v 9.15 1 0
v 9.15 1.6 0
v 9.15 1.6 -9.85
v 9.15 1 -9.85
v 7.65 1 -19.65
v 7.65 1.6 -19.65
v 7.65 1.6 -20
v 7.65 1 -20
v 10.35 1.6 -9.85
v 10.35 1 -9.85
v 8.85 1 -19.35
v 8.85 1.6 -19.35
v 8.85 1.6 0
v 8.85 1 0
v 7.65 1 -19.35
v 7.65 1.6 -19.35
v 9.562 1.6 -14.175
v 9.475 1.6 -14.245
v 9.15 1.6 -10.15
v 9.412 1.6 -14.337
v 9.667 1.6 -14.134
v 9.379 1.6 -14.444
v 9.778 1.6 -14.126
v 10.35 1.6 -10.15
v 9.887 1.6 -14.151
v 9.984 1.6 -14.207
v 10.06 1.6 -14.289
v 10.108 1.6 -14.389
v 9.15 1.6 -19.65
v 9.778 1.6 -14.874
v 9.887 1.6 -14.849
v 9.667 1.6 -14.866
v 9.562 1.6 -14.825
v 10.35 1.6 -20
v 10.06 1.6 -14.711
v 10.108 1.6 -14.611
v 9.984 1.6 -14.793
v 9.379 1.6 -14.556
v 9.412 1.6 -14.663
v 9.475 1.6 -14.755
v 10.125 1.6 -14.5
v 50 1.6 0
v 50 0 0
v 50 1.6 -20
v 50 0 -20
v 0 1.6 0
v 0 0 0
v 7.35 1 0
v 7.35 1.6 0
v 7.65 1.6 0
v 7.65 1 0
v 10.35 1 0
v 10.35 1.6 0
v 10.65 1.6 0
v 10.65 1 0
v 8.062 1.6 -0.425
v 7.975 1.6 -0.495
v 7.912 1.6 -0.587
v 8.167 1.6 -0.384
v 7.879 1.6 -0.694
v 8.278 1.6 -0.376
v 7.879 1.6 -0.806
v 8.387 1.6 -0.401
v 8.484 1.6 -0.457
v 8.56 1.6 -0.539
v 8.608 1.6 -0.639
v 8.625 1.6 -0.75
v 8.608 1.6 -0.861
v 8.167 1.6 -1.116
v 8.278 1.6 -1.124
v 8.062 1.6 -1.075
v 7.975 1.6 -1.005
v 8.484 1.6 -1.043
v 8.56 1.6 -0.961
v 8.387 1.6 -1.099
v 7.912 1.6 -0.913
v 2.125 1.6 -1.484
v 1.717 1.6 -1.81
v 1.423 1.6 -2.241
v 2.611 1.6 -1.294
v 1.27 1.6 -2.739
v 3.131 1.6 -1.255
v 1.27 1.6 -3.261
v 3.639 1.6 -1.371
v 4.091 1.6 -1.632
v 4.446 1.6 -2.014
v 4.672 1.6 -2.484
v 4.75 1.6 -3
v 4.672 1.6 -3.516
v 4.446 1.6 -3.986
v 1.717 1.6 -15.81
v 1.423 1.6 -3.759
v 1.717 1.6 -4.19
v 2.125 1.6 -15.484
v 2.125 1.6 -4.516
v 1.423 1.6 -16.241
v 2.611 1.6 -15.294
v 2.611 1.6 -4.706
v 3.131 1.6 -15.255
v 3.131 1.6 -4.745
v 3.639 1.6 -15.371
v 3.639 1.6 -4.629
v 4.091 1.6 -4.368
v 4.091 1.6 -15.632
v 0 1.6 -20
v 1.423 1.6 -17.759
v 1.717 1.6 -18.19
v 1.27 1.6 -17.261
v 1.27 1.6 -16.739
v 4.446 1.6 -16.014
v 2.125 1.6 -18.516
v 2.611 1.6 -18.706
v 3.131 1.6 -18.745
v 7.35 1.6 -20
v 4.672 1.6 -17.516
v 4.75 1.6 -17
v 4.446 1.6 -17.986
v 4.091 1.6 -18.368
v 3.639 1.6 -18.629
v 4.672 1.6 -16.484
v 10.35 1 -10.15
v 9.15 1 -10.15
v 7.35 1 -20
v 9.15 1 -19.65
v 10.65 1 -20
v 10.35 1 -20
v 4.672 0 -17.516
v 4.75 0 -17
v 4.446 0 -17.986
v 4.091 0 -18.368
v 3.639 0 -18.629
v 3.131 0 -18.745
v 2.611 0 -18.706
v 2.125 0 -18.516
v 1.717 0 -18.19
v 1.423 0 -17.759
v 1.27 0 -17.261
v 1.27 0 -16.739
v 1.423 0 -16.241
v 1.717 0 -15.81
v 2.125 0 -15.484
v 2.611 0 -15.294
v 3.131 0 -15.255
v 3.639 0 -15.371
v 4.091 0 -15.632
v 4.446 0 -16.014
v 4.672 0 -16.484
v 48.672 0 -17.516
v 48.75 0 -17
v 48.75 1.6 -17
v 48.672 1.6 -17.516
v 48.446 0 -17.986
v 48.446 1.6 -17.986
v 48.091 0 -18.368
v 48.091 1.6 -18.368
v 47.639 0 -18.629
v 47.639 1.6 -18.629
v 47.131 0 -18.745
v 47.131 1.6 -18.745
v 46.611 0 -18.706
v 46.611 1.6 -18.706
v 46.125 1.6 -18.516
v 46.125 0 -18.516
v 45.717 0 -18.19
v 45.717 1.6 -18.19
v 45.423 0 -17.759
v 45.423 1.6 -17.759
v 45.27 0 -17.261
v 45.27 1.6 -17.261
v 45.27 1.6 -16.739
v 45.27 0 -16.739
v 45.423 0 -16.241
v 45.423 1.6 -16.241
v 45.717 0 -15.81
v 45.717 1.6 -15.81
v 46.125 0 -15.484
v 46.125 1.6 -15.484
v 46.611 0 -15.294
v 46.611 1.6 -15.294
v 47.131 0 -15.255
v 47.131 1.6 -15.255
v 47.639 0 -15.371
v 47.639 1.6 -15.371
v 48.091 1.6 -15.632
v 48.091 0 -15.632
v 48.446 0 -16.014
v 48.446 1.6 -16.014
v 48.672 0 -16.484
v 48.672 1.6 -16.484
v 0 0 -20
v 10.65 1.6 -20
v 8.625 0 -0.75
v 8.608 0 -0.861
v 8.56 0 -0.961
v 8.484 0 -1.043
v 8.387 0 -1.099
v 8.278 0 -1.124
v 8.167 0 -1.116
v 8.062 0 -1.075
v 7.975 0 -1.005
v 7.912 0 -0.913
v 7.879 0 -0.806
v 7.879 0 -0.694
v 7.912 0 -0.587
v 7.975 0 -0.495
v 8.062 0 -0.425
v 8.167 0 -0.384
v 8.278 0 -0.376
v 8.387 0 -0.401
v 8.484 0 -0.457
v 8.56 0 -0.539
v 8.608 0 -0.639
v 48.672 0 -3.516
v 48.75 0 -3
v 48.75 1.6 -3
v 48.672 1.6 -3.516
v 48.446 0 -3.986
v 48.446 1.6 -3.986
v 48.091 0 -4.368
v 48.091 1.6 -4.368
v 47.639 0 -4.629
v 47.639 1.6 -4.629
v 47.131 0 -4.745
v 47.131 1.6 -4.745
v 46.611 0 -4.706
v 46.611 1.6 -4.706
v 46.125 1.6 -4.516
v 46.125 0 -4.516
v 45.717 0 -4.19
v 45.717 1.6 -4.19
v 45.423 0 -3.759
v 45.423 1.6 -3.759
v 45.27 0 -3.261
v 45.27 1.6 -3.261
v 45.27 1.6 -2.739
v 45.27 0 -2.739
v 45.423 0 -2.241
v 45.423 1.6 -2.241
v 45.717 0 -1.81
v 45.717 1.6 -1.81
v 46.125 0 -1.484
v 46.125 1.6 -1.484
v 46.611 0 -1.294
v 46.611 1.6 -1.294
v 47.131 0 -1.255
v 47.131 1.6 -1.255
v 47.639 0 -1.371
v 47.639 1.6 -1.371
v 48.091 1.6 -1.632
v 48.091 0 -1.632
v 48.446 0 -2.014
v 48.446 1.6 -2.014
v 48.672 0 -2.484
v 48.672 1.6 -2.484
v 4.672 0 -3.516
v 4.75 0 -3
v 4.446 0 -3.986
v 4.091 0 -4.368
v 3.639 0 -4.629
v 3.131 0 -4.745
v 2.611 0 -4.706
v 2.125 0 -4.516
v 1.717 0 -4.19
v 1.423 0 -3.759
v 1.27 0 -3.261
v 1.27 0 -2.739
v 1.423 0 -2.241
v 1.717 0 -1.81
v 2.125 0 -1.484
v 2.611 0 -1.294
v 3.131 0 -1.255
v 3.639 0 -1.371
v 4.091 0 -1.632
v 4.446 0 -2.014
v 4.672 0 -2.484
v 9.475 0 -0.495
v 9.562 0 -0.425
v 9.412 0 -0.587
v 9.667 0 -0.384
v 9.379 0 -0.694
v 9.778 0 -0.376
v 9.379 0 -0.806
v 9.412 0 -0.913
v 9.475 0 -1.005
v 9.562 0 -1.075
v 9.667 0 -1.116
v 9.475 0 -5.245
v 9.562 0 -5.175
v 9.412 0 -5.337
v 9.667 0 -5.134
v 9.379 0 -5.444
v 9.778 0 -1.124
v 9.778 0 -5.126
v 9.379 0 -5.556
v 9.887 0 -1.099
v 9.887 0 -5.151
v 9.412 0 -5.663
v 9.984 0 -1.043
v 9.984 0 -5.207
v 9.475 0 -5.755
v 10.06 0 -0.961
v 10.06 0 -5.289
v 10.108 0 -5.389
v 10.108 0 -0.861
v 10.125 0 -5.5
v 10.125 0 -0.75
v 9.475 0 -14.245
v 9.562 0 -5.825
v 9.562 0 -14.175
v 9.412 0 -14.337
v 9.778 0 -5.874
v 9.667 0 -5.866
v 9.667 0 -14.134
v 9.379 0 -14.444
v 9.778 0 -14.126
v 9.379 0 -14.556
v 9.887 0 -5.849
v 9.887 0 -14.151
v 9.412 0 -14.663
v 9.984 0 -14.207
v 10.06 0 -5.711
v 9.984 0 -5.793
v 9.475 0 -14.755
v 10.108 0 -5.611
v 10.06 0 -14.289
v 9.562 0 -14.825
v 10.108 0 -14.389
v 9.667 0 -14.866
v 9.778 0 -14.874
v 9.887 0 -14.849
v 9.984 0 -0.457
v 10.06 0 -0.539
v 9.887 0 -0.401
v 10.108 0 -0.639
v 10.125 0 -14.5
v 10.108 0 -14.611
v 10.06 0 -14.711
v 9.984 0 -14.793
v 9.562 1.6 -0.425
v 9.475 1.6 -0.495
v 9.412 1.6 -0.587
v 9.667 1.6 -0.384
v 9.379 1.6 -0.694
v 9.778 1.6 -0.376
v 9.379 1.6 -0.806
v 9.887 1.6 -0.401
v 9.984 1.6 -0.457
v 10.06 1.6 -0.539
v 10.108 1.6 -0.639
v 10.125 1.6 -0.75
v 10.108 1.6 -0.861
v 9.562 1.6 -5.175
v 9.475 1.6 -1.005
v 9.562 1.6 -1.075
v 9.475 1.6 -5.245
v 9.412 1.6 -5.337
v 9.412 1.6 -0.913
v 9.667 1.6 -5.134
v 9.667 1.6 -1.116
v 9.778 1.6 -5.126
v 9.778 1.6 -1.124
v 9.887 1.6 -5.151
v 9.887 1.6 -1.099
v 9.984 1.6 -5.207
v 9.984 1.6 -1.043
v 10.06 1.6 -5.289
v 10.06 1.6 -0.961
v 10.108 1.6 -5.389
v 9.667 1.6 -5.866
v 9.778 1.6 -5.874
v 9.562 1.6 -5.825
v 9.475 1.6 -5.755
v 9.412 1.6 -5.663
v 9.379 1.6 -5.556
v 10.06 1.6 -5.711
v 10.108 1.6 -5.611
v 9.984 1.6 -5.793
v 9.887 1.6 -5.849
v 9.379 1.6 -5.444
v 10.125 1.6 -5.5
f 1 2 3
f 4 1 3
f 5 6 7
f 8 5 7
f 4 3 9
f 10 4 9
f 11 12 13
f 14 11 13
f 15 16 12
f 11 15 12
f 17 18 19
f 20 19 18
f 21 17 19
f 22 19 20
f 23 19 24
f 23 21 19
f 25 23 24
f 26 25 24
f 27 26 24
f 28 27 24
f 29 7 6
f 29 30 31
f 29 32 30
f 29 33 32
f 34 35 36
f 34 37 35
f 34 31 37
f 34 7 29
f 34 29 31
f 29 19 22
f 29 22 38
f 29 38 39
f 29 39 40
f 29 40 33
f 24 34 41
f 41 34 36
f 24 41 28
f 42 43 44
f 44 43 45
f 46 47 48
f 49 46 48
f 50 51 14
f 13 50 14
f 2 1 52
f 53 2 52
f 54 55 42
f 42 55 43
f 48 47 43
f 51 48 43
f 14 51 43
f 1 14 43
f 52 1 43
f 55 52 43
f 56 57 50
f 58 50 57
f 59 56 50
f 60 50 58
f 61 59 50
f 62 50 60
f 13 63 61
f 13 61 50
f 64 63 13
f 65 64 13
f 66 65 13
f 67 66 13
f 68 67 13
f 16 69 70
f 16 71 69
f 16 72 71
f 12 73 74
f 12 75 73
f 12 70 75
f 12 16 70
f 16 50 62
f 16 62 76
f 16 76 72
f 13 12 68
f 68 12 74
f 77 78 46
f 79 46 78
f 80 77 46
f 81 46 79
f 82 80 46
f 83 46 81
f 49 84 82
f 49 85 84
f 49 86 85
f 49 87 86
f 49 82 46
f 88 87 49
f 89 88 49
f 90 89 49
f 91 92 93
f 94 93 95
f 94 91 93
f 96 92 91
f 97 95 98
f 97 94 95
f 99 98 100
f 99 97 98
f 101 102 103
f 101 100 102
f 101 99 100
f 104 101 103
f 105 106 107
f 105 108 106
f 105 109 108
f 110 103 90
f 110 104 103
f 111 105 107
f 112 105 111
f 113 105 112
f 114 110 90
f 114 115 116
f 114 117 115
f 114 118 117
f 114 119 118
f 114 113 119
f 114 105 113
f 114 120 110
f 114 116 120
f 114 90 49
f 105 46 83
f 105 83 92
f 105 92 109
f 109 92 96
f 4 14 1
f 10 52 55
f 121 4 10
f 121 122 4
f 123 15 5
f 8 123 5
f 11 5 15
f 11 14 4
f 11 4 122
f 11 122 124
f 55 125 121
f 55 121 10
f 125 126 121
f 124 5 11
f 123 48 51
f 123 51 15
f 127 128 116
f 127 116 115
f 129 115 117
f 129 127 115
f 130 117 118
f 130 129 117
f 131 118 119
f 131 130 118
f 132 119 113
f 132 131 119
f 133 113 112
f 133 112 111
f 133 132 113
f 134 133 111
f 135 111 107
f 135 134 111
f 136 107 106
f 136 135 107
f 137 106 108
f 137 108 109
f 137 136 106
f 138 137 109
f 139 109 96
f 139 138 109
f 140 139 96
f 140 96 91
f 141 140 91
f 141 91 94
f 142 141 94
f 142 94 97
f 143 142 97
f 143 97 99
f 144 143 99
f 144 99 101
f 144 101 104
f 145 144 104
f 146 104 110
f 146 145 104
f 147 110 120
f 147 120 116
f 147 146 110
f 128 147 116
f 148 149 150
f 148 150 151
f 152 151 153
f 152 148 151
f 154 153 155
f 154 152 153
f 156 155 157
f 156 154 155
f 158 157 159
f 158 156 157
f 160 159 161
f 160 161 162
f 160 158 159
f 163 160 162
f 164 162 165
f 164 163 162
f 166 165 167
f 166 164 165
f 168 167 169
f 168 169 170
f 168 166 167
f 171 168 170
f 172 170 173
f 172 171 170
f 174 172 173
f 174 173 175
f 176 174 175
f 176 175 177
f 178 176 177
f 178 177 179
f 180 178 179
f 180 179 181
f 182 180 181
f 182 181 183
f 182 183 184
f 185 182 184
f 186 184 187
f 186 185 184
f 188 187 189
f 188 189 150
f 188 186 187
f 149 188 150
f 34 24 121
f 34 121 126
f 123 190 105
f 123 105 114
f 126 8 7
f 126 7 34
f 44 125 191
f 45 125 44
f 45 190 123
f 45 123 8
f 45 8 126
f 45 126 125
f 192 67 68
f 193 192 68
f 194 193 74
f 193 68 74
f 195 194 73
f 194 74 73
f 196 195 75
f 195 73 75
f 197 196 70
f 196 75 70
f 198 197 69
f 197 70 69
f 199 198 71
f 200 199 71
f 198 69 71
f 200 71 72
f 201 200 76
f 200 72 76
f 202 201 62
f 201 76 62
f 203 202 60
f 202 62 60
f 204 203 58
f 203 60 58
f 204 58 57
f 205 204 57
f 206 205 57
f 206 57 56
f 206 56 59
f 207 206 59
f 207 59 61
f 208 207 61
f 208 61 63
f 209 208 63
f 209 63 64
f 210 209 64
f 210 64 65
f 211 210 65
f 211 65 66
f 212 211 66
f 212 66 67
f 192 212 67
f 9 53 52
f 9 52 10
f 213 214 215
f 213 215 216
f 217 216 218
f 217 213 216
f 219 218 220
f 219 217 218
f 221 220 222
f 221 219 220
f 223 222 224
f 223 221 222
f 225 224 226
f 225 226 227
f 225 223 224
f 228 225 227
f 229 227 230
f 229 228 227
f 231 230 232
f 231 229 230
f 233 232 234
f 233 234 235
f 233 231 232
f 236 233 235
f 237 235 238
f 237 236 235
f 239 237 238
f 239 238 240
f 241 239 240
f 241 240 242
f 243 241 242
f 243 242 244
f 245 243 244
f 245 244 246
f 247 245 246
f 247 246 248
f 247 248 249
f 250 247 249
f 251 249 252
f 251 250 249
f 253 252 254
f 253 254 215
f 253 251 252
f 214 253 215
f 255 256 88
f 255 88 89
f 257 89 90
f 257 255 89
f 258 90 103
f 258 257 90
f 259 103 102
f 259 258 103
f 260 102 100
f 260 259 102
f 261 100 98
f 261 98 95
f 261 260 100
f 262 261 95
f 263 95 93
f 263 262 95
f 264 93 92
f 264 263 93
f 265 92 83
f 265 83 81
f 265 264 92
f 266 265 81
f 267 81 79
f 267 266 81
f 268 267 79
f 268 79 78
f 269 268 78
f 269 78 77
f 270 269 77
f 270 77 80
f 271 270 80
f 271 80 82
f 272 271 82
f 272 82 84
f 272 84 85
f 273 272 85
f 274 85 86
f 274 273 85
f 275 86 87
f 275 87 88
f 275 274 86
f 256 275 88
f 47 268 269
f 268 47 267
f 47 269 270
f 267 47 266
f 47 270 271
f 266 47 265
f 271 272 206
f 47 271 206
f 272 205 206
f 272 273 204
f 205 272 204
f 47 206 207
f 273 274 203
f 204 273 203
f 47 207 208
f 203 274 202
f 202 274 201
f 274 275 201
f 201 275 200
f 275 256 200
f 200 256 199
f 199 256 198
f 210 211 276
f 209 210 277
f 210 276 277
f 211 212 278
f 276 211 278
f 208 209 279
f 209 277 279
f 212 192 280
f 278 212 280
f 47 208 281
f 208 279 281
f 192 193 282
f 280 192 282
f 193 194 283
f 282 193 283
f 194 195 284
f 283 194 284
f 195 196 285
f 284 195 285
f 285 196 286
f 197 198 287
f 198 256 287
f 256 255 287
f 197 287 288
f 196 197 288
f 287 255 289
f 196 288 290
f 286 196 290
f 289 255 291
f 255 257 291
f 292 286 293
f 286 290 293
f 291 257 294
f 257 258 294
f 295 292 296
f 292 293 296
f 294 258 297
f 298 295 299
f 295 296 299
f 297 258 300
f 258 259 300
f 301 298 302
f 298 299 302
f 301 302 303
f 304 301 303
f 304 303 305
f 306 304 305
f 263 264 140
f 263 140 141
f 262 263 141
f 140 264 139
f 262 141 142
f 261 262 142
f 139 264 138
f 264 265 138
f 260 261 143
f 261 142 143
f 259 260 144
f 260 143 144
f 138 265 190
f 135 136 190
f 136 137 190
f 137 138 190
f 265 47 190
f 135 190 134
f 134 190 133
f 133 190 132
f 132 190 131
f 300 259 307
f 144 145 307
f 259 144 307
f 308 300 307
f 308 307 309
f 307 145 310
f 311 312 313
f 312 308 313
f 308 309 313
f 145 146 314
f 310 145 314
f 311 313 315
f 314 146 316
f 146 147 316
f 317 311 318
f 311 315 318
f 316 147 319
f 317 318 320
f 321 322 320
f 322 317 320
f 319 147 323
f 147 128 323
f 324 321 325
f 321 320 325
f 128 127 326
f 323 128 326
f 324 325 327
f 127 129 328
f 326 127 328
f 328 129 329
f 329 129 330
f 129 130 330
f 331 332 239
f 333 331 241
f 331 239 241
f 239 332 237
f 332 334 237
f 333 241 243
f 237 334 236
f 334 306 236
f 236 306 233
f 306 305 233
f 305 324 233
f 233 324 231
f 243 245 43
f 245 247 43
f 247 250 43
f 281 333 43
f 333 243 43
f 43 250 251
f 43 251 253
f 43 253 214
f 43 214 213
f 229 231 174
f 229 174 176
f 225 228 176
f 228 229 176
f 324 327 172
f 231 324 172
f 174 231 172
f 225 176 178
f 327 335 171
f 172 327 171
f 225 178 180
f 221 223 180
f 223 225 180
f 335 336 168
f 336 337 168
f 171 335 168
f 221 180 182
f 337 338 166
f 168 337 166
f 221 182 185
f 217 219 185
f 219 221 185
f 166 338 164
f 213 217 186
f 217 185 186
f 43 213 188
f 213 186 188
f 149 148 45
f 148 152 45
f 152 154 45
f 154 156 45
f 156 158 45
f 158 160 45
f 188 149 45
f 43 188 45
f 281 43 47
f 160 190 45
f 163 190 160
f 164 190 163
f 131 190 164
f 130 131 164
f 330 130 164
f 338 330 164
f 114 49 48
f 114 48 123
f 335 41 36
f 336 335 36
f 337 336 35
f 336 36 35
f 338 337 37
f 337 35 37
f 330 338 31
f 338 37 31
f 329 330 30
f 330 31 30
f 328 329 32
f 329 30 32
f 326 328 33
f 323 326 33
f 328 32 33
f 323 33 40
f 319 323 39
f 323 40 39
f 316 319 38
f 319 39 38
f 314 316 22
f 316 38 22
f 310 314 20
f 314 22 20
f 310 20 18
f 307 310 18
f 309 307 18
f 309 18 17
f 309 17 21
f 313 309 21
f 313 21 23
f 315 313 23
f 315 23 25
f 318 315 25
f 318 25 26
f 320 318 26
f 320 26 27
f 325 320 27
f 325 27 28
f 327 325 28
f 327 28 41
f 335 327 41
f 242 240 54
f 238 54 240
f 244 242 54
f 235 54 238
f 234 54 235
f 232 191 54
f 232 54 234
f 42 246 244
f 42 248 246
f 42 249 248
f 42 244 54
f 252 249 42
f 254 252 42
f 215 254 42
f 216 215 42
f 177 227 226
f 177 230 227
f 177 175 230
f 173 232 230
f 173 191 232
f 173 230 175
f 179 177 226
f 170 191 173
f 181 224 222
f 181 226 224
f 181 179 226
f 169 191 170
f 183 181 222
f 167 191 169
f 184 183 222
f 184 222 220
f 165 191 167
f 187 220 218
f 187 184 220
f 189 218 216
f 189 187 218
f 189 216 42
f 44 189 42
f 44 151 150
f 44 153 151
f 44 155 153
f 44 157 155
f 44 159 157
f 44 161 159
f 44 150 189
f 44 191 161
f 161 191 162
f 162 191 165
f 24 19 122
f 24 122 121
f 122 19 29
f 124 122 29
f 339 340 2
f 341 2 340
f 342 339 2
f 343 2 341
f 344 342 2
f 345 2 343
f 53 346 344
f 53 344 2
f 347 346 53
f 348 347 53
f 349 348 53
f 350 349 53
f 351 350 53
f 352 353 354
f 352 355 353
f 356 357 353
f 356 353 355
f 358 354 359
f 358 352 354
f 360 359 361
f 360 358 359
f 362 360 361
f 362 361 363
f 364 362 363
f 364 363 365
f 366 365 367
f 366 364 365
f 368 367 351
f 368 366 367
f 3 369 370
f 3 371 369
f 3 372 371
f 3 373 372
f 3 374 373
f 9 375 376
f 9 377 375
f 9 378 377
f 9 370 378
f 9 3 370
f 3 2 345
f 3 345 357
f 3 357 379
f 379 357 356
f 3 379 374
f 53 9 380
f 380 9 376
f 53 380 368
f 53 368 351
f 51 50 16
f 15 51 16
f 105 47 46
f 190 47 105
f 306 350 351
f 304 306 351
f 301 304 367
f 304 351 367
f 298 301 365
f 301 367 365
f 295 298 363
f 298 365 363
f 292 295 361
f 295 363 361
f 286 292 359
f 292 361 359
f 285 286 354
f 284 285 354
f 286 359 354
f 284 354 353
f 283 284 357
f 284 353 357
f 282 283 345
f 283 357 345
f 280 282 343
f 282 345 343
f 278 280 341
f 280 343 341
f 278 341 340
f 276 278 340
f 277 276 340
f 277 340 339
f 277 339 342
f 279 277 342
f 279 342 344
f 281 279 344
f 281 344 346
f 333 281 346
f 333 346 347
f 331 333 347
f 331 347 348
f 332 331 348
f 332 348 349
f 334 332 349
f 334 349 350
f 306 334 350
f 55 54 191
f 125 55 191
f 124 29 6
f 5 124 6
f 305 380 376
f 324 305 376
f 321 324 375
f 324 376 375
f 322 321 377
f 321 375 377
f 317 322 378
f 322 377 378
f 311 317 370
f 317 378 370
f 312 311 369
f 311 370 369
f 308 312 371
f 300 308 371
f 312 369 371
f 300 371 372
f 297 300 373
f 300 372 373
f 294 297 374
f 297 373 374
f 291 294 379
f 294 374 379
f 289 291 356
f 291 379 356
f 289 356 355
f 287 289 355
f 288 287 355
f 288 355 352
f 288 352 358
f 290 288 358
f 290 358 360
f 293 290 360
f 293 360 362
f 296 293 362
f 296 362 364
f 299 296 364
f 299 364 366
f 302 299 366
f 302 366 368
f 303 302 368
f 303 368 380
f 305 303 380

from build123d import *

# Parameters (mm, degrees)
SKETCH1_W           = 50
SKETCH1_H           = 20
SKETCH1_R           = 1.75
BOSS_EXTRUDE1_DEPTH = 1.6
SKETCH3_R           = 0.375
CUT_EXTRUDE1_DEPTH  = 2.6
SKETCH2_W           = 0.3
SKETCH2_H           = 20
SKETCH2_W_2         = 1.5
SKETCH2_H_2         = 0.3
CUT_EXTRUDE2_DEPTH  = 0.6


with BuildPart() as part:
    # Sketch1 → Boss-Extrude1 (new body)
    with BuildSketch(Plane(origin=(0, 0, 0), x_dir=(1, 0, 0), z_dir=(0, 1, 0))):
        with Locations((25, 10)):
            Rectangle(SKETCH1_W, SKETCH1_H)
        with Locations((3, 17)):
            Circle(SKETCH1_R, mode=Mode.SUBTRACT)
        with Locations((47, 3)):
            Circle(SKETCH1_R, mode=Mode.SUBTRACT)
        with Locations((3, 3)):
            Circle(SKETCH1_R, mode=Mode.SUBTRACT)
        with Locations((47, 17)):
            Circle(SKETCH1_R, mode=Mode.SUBTRACT)
    extrude(amount=BOSS_EXTRUDE1_DEPTH)

    # Sketch3 → Cut-Extrude1 (cut, through all)
    with BuildSketch(Plane(origin=(0, 1.6, 0), x_dir=(1, 0, 0), z_dir=(0, 1, 0))):
        with Locations((8.25, 0.75)):
            Circle(SKETCH3_R)
        with Locations((9.75, 0.75)):
            Circle(SKETCH3_R)
        with Locations((9.75, 5.5)):
            Circle(SKETCH3_R)
        with Locations((9.75, 14.5)):
            Circle(SKETCH3_R)
    extrude(amount=-CUT_EXTRUDE1_DEPTH, mode=Mode.SUBTRACT)

    # Sketch2 → Cut-Extrude2 (cut)
    with BuildSketch(Plane(origin=(0, 1.6, 0), x_dir=(1, 0, 0), z_dir=(0, 1, 0))):
        Polygon((9.15, 0), (9.15, 19.65), (7.5, 19.65), (7.5, 19.35), (8.85, 19.35), (8.85, 0), align=None)
        with Locations((7.5, 10)):
            Rectangle(SKETCH2_W, SKETCH2_H)
        with Locations((10.5, 10)):
            Rectangle(SKETCH2_W, SKETCH2_H)
        with Locations((9.75, 10)):
            Rectangle(SKETCH2_W_2, SKETCH2_H_2)
    extrude(amount=-CUT_EXTRUDE2_DEPTH, mode=Mode.SUBTRACT)


solid = part.part
